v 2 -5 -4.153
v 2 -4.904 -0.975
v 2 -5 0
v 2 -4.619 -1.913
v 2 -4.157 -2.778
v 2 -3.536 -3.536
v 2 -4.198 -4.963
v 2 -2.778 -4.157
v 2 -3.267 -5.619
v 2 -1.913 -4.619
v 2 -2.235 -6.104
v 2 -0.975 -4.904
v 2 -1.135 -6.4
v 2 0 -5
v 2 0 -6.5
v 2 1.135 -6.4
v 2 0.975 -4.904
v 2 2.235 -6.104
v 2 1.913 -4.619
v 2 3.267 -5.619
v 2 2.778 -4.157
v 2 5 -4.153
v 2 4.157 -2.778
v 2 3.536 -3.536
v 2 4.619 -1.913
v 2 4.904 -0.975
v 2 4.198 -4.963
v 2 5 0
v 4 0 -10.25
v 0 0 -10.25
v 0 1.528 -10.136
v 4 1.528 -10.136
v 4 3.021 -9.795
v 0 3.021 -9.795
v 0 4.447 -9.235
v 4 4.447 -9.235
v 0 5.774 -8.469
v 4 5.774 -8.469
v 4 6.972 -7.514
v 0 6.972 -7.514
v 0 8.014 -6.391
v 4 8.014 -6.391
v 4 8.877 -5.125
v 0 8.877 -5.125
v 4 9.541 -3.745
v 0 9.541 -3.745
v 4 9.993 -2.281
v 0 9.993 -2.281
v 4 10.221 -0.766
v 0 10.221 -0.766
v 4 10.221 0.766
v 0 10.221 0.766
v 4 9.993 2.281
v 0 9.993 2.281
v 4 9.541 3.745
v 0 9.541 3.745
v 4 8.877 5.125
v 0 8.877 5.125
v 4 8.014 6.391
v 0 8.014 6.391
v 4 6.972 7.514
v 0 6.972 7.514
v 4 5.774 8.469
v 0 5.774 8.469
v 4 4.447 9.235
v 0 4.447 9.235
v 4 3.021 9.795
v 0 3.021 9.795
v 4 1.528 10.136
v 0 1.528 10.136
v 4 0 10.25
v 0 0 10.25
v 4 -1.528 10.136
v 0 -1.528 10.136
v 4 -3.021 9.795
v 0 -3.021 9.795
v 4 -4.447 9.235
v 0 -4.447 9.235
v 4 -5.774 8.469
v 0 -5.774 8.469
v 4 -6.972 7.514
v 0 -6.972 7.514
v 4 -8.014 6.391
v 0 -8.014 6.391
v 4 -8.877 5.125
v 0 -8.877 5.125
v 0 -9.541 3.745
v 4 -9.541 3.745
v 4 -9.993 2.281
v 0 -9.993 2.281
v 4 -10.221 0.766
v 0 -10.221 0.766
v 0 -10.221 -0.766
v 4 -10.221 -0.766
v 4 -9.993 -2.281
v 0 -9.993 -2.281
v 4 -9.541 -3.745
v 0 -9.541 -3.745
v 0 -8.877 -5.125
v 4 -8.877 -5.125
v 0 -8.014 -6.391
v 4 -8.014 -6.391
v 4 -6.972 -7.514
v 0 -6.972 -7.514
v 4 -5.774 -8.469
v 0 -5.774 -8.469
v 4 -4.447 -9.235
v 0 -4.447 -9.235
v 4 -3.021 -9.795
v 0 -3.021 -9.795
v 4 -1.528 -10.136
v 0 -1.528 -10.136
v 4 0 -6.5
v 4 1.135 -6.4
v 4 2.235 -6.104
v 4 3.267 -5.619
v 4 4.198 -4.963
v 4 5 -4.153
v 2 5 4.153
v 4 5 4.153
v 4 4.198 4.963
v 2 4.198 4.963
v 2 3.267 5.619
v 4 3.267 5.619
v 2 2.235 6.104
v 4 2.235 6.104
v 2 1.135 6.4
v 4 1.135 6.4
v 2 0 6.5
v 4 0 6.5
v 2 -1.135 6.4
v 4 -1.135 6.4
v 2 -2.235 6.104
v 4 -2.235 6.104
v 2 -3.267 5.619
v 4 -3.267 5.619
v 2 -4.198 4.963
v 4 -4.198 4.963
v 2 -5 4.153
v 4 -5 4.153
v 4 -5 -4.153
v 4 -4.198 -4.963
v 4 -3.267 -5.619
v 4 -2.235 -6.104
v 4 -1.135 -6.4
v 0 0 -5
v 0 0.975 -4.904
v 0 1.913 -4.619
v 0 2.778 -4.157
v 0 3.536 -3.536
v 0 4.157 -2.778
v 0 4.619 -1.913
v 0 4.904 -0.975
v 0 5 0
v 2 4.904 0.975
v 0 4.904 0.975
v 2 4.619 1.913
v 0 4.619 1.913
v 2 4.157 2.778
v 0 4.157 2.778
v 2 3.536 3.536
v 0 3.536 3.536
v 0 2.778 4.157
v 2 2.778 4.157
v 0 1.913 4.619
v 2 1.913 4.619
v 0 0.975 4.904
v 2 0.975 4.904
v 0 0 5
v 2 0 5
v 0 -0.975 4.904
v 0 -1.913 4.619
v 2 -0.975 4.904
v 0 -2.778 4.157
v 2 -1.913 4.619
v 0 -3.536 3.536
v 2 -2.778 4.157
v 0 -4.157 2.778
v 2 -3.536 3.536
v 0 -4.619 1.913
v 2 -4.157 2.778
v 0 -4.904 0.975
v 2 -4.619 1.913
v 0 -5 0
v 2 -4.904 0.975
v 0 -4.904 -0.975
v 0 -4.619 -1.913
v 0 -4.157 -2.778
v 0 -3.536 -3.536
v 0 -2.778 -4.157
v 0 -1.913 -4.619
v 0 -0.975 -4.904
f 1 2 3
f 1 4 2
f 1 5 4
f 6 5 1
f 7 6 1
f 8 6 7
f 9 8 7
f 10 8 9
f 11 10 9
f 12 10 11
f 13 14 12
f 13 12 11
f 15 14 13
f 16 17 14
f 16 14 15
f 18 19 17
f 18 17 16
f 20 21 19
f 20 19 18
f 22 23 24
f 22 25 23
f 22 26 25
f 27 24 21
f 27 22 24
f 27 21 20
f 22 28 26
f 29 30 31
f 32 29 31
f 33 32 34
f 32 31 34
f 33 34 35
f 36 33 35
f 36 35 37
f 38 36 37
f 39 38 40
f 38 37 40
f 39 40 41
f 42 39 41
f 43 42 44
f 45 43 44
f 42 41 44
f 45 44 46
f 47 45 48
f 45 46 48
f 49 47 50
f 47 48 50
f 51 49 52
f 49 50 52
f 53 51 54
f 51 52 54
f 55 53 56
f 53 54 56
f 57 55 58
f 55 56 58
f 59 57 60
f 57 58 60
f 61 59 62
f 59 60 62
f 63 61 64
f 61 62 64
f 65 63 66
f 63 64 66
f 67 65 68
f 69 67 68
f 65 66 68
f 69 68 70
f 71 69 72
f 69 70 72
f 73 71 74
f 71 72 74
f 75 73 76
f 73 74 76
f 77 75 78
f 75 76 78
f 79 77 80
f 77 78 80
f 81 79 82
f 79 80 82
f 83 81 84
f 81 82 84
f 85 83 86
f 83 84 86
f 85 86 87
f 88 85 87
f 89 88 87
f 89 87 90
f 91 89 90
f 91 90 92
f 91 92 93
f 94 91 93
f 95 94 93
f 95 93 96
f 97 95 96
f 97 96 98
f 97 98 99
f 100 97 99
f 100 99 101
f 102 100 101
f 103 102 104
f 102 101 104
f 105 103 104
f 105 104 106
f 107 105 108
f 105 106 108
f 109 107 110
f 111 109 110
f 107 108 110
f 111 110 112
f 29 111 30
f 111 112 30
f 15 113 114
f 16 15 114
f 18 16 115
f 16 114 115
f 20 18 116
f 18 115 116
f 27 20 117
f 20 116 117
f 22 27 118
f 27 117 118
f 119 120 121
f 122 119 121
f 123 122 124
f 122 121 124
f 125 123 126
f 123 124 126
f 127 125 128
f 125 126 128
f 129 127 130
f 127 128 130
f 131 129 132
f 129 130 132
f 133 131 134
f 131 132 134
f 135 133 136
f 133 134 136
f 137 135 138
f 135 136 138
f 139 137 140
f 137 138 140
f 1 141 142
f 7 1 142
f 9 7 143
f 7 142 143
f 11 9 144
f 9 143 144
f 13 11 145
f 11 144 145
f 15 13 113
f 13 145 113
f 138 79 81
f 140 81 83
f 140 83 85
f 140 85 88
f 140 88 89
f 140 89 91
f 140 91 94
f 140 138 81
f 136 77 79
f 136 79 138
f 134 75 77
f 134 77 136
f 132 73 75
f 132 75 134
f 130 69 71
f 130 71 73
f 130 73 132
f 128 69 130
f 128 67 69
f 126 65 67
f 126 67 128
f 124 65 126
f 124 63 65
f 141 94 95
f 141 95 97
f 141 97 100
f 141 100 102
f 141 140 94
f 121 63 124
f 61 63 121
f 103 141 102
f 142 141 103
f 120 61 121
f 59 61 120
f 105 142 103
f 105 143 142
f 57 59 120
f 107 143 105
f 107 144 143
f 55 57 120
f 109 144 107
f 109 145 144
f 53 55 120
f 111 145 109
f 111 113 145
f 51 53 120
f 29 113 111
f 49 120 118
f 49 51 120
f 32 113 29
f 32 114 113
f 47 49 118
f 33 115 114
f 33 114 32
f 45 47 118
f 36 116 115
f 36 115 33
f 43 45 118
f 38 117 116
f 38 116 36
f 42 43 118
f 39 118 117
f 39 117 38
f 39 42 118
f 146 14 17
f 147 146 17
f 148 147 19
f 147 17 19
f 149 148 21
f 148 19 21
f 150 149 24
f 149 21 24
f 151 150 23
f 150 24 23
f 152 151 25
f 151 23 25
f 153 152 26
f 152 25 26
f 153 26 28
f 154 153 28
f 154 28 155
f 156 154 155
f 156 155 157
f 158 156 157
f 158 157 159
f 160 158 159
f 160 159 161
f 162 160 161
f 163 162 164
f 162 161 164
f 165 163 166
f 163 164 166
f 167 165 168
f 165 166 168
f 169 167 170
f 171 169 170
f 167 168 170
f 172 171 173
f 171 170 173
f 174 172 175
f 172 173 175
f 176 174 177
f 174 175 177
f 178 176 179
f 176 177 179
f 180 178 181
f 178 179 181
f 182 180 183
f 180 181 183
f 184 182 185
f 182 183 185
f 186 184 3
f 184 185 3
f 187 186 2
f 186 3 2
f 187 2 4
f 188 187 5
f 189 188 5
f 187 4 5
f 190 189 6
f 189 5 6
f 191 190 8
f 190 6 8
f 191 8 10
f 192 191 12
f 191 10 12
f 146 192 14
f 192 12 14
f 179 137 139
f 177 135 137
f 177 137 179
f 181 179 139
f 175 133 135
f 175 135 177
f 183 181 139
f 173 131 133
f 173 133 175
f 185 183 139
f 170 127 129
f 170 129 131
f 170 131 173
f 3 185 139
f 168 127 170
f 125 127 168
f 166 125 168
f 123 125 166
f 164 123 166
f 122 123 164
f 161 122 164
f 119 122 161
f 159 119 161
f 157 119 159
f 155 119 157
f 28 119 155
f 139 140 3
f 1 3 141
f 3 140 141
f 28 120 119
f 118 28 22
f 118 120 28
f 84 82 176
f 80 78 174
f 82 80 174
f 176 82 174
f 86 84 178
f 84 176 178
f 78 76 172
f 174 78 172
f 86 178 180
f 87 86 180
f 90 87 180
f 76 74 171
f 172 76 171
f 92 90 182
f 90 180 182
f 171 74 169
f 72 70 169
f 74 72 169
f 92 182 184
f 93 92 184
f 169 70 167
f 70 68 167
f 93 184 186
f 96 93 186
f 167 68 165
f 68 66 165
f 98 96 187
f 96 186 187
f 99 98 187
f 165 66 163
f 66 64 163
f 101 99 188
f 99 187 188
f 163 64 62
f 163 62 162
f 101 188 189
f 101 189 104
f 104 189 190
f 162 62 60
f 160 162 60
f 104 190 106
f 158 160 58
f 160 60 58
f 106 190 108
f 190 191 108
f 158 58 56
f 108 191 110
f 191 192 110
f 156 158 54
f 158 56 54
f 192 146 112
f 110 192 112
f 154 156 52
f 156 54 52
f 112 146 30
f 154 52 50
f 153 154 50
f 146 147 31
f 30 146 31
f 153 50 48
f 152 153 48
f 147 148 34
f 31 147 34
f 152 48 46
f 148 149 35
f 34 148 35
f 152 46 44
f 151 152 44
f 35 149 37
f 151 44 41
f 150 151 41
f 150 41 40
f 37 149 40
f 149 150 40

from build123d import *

# Parameters (mm, degrees)
SKETCH1_R           = 10.25
BOSS_EXTRUDE1_DEPTH = 4
SKETCH2_W           = 8.306623862
SKETCH2_H           = 10
CUT_EXTRUDE1_DEPTH  = 2
SKETCH3_R           = 5
CUT_EXTRUDE2_DEPTH  = 3


with BuildPart() as part:
    # Sketch1 → Boss-Extrude1 (new body)
    with BuildSketch(Plane(origin=(0, 0, 0), x_dir=(0, 0, -1), z_dir=(1, 0, 0))):
        Circle(SKETCH1_R)
    extrude(amount=BOSS_EXTRUDE1_DEPTH)

    # Sketch2 → Cut-Extrude1 (cut)
    with BuildSketch(Plane(origin=(4, 0, 0), x_dir=(0, 0, -1), z_dir=(1, 0, 0))):
        with BuildLine():
            ThreePointArc((-4.153311931, 5), (-6.5, 0), (-4.153311931, -5))
            Line((-4.153311931, -5), (-4.153311931, 5))
        make_face()
        Rectangle(SKETCH2_W, SKETCH2_H)
        with BuildLine():
            Line((4.153311931, 5), (4.153311931, -5))
            ThreePointArc((4.153311931, -5), (5.884153616, -2.761654617), (6.5, 0))
            ThreePointArc((6.5, 0), (5.884153616, 2.761654617), (4.153311931, 5))
        make_face()
    extrude(amount=-CUT_EXTRUDE1_DEPTH, mode=Mode.SUBTRACT)

    # Sketch3 → Cut-Extrude2 (cut, through all)
    with BuildSketch(Plane(origin=(2, 0, 0), x_dir=(0, 0, -1), z_dir=(1, 0, 0))):
        Circle(SKETCH3_R)
    extrude(amount=-CUT_EXTRUDE2_DEPTH, mode=Mode.SUBTRACT)


solid = part.part
